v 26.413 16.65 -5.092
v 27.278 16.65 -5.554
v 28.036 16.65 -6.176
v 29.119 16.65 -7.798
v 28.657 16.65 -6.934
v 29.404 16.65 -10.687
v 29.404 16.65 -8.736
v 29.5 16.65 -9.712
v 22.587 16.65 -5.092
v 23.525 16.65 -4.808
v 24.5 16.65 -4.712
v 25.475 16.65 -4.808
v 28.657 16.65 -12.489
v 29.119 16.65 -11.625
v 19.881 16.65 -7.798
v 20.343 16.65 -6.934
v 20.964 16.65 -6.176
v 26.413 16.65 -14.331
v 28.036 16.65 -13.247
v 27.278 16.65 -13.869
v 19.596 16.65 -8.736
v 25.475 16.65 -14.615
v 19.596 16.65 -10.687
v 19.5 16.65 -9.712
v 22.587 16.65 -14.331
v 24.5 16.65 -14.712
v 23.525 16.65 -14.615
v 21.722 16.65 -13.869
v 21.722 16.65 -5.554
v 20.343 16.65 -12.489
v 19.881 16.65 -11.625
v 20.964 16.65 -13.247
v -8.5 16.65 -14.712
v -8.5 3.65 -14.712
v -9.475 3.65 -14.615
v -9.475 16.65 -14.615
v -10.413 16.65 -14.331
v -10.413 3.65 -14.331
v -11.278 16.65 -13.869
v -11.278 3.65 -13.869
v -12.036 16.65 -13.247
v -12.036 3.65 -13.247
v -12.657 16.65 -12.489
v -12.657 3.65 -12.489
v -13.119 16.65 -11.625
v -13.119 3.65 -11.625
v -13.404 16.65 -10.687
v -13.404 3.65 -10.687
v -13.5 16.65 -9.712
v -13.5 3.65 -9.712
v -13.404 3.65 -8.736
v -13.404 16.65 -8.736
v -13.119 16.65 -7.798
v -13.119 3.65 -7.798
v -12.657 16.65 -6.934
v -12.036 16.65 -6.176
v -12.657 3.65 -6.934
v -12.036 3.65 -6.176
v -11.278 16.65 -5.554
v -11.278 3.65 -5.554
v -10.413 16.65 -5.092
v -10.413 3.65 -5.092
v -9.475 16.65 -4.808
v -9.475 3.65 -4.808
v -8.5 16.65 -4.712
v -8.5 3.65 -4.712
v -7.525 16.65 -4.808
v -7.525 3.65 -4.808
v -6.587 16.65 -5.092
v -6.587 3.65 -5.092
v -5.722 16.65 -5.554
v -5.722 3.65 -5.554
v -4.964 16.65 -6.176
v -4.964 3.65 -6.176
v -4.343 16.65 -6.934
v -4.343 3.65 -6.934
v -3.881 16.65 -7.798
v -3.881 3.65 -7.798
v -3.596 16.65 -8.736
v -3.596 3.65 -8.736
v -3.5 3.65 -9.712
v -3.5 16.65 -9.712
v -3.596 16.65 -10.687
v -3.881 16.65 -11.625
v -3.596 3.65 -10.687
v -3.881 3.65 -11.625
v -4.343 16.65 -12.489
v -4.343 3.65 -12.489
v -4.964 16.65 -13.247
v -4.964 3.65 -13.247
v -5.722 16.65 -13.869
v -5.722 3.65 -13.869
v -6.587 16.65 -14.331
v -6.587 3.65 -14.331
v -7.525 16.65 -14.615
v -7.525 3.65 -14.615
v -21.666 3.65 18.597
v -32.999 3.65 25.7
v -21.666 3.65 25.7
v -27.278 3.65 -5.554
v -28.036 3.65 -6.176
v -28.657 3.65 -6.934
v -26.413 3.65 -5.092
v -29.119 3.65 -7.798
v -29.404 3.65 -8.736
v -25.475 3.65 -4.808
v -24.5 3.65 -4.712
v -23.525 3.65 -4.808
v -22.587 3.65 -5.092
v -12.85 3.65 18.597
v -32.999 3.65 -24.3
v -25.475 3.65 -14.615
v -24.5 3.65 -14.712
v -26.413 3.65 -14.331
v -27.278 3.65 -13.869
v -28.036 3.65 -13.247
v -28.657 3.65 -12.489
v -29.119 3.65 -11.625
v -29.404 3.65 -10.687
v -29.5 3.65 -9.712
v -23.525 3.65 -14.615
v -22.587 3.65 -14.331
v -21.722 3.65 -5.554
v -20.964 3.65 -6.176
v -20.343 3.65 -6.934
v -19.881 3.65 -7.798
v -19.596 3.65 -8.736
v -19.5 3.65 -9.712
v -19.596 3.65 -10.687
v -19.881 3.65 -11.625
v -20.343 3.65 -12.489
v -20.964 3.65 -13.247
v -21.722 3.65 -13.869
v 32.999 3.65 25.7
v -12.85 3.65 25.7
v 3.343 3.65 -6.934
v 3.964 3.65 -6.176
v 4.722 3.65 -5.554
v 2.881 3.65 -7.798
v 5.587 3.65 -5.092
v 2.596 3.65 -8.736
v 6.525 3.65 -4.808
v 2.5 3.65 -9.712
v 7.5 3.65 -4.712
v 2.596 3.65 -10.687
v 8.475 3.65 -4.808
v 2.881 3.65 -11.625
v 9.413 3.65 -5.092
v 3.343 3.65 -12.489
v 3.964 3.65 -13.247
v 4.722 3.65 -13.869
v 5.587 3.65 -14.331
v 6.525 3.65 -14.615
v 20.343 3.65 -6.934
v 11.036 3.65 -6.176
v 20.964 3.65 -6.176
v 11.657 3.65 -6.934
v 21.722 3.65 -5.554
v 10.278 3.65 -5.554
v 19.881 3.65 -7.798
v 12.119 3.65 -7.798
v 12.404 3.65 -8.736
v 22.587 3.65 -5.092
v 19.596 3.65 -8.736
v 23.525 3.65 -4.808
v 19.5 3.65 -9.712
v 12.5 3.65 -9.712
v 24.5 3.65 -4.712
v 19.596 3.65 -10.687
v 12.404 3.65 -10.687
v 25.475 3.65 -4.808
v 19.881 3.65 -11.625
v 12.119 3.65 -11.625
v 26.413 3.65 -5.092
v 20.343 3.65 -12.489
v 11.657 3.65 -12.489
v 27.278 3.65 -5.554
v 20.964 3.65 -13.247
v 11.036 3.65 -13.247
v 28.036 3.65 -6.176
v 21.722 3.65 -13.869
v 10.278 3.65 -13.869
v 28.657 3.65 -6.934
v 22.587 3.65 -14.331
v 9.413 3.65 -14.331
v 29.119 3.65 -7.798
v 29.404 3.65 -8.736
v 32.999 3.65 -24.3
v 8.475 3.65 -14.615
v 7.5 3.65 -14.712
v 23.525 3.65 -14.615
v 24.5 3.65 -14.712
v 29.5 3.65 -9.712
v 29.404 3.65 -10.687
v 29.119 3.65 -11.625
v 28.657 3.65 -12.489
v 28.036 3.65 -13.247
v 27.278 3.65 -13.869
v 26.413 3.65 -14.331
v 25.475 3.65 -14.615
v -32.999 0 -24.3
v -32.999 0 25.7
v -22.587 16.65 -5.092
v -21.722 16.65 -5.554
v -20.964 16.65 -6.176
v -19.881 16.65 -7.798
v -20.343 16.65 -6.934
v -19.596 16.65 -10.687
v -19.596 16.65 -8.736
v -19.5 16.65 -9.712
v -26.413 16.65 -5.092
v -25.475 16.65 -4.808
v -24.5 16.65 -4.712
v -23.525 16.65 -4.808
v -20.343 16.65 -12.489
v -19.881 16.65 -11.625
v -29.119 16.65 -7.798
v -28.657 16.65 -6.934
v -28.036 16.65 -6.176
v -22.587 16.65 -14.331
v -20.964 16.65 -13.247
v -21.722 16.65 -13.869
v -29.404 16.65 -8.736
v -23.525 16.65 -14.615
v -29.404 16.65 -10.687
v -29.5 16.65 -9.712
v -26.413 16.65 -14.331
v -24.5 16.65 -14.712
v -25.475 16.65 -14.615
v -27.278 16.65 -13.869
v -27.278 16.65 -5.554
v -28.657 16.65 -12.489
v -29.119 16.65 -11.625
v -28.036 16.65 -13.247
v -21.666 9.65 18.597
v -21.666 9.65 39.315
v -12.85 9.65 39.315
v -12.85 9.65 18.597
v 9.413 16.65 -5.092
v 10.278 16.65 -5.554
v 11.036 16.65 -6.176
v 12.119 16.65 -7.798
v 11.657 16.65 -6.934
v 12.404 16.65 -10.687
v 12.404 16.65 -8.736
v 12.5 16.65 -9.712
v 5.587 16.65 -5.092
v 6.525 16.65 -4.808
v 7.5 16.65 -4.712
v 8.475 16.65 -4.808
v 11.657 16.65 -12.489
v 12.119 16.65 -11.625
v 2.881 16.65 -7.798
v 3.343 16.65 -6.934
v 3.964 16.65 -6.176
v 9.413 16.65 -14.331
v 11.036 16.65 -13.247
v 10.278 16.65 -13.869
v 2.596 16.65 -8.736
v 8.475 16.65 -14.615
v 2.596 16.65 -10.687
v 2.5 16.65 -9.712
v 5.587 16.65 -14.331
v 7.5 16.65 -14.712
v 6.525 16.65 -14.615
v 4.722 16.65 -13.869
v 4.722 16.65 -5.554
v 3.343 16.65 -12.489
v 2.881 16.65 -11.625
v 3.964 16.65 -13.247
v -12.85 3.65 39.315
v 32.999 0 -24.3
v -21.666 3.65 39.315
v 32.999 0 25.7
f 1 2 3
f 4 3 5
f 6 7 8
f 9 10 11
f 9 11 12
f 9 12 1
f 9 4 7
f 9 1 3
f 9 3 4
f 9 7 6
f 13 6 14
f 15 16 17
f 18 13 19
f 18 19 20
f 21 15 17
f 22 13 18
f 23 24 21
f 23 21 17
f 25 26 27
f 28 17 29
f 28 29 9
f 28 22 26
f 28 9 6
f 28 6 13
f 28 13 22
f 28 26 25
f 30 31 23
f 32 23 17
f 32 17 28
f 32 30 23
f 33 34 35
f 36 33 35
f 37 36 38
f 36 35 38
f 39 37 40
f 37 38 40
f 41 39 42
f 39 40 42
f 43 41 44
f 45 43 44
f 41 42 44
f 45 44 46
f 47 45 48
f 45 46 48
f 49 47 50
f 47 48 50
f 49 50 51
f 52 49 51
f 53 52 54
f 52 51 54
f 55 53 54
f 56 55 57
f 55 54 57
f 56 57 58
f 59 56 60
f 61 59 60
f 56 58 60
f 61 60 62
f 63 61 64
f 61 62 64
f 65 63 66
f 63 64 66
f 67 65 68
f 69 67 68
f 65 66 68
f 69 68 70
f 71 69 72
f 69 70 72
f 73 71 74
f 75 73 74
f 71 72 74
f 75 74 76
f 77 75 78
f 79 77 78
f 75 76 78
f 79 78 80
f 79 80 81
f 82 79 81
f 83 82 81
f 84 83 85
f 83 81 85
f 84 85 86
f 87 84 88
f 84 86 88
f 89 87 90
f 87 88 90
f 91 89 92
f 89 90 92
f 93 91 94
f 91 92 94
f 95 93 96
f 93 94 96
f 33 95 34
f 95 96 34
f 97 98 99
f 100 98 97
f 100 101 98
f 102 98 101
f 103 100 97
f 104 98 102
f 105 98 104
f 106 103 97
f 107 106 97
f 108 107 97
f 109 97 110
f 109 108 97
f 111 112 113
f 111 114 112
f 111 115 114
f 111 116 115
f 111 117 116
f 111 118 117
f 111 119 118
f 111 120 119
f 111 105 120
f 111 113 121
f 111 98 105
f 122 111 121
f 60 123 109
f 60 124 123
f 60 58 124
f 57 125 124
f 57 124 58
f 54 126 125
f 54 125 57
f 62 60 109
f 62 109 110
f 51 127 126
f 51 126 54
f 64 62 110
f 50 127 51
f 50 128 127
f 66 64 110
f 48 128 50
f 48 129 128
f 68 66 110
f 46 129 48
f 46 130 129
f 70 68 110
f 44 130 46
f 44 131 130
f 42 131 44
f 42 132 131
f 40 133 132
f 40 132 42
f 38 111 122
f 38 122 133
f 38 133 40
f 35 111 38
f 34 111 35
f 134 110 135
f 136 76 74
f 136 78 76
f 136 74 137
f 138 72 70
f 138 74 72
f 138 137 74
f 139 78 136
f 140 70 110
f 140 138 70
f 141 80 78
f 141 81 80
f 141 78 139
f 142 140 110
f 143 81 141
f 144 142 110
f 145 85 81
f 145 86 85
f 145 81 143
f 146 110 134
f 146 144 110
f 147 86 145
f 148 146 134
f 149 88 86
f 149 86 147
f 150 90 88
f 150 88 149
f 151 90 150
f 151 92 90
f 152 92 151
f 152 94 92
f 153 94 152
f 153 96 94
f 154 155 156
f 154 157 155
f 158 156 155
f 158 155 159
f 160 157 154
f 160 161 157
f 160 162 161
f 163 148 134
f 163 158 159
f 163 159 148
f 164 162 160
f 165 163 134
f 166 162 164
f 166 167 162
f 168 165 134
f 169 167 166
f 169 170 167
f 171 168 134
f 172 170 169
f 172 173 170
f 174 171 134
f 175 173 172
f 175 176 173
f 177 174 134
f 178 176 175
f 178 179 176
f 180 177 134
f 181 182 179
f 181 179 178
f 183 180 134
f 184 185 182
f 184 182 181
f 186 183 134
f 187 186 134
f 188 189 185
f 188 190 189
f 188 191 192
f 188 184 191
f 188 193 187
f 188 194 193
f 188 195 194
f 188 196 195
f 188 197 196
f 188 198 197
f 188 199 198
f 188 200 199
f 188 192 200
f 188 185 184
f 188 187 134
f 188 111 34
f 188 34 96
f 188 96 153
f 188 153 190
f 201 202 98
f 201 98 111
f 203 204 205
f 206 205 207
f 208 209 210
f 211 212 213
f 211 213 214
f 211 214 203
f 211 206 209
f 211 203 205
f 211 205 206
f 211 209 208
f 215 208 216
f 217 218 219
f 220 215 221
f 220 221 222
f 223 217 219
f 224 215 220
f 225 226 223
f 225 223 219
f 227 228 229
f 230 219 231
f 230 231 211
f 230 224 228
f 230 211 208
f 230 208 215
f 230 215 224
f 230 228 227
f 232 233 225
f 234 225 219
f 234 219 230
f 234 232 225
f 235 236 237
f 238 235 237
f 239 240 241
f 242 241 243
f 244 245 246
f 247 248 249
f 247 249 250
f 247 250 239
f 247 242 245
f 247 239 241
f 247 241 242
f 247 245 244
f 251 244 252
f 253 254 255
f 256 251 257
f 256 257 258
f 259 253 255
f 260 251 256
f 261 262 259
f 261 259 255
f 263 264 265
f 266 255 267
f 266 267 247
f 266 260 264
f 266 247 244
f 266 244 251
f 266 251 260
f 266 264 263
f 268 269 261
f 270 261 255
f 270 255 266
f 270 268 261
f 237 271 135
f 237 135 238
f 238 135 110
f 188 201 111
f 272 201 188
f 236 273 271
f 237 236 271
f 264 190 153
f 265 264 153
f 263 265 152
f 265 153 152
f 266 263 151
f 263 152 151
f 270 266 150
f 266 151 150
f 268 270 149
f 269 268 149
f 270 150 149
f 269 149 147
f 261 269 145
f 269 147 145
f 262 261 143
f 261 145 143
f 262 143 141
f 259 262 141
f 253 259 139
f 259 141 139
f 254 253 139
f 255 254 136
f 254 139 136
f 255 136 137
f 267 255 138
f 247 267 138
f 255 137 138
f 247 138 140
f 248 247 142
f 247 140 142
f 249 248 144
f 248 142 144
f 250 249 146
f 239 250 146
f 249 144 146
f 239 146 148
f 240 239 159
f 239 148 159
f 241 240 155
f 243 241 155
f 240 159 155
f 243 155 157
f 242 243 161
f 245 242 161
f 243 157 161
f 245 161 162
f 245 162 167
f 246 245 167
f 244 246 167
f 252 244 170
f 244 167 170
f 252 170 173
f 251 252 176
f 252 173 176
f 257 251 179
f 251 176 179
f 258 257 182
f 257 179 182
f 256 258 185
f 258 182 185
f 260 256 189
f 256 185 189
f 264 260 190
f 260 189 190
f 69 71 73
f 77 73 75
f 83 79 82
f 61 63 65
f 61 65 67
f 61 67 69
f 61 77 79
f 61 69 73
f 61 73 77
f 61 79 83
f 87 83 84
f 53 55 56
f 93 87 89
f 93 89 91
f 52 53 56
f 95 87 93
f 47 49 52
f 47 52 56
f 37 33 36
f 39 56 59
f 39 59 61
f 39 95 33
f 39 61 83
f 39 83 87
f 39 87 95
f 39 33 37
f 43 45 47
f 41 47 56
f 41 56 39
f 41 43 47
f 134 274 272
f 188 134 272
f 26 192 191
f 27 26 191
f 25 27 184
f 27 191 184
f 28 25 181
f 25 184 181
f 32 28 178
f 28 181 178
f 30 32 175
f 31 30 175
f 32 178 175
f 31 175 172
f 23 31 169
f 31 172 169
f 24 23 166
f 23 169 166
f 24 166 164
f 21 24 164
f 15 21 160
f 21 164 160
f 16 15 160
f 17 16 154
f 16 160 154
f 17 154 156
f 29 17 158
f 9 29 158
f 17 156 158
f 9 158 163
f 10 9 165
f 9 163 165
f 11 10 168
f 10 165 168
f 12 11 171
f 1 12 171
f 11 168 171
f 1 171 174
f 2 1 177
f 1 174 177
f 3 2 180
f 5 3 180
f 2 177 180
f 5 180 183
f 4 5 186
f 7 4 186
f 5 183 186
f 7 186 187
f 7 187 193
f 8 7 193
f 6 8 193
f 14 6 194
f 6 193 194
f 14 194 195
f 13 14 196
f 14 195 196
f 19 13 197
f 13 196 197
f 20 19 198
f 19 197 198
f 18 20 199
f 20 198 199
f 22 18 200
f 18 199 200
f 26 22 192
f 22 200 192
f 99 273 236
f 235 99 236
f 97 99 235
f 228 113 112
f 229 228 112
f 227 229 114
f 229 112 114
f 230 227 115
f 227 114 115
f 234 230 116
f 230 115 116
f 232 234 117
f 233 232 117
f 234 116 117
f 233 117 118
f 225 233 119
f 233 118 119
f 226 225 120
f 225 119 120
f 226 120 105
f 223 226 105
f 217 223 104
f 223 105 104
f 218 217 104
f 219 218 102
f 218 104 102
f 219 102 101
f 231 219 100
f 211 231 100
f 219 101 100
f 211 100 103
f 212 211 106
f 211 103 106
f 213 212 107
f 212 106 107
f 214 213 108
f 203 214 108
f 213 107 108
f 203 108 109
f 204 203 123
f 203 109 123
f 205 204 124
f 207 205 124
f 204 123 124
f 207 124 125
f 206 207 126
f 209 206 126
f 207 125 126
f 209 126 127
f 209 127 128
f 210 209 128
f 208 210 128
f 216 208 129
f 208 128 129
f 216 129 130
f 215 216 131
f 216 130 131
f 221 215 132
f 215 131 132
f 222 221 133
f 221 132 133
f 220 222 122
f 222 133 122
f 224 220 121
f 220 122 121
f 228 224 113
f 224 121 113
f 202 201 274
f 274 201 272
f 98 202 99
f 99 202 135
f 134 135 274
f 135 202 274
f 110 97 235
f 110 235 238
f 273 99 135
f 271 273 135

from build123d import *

# Parameters (mm, degrees)
SKETCH1_W           = 65.997826612
SKETCH1_H           = 50
BOSS_EXTRUDE1_DEPTH = 3.65
SKETCH2_R           = 5
BOSS_EXTRUDE2_DEPTH = 13
SKETCH3_W           = 8.816306995
SKETCH3_H           = 20.718287769
BOSS_EXTRUDE3_DEPTH = 6


with BuildPart() as part:
    # Sketch1 → Boss-Extrude1 (new body)
    with BuildSketch(Plane(origin=(0, 0, 0), x_dir=(1, 0, 0), z_dir=(0, 1, 0))):
        with Locations((0, -0.7)):
            Rectangle(SKETCH1_W, SKETCH1_H)
    extrude(amount=BOSS_EXTRUDE1_DEPTH)

    # Sketch2 → Boss-Extrude2 (add)
    with BuildSketch(Plane(origin=(0, 3.65, 0), x_dir=(1, 0, 0), z_dir=(0, 1, 0))):
        with Locations(Location((-24.5, 9.711573264, 0), (0, 0, 90))):
            Circle(SKETCH2_R)
        with Locations(Location((-8.5, 9.711573264, 0), (0, 0, 90))):
            Circle(SKETCH2_R)
        with Locations(Location((7.5, 9.711573264, 0), (0, 0, 90))):
            Circle(SKETCH2_R)
        with Locations(Location((24.5, 9.711573264, 0), (0, 0, 90))):
            Circle(SKETCH2_R)
    extrude(amount=BOSS_EXTRUDE2_DEPTH)

    # Sketch3 → Boss-Extrude3 (add)
    with BuildSketch(Plane(origin=(0, 3.65, 0), x_dir=(1, 0, 0), z_dir=(0, 1, 0))):
        with Locations((-17.257821891, -28.955694161)):
            Rectangle(SKETCH3_W, SKETCH3_H)
    extrude(amount=BOSS_EXTRUDE3_DEPTH)


solid = part.part
